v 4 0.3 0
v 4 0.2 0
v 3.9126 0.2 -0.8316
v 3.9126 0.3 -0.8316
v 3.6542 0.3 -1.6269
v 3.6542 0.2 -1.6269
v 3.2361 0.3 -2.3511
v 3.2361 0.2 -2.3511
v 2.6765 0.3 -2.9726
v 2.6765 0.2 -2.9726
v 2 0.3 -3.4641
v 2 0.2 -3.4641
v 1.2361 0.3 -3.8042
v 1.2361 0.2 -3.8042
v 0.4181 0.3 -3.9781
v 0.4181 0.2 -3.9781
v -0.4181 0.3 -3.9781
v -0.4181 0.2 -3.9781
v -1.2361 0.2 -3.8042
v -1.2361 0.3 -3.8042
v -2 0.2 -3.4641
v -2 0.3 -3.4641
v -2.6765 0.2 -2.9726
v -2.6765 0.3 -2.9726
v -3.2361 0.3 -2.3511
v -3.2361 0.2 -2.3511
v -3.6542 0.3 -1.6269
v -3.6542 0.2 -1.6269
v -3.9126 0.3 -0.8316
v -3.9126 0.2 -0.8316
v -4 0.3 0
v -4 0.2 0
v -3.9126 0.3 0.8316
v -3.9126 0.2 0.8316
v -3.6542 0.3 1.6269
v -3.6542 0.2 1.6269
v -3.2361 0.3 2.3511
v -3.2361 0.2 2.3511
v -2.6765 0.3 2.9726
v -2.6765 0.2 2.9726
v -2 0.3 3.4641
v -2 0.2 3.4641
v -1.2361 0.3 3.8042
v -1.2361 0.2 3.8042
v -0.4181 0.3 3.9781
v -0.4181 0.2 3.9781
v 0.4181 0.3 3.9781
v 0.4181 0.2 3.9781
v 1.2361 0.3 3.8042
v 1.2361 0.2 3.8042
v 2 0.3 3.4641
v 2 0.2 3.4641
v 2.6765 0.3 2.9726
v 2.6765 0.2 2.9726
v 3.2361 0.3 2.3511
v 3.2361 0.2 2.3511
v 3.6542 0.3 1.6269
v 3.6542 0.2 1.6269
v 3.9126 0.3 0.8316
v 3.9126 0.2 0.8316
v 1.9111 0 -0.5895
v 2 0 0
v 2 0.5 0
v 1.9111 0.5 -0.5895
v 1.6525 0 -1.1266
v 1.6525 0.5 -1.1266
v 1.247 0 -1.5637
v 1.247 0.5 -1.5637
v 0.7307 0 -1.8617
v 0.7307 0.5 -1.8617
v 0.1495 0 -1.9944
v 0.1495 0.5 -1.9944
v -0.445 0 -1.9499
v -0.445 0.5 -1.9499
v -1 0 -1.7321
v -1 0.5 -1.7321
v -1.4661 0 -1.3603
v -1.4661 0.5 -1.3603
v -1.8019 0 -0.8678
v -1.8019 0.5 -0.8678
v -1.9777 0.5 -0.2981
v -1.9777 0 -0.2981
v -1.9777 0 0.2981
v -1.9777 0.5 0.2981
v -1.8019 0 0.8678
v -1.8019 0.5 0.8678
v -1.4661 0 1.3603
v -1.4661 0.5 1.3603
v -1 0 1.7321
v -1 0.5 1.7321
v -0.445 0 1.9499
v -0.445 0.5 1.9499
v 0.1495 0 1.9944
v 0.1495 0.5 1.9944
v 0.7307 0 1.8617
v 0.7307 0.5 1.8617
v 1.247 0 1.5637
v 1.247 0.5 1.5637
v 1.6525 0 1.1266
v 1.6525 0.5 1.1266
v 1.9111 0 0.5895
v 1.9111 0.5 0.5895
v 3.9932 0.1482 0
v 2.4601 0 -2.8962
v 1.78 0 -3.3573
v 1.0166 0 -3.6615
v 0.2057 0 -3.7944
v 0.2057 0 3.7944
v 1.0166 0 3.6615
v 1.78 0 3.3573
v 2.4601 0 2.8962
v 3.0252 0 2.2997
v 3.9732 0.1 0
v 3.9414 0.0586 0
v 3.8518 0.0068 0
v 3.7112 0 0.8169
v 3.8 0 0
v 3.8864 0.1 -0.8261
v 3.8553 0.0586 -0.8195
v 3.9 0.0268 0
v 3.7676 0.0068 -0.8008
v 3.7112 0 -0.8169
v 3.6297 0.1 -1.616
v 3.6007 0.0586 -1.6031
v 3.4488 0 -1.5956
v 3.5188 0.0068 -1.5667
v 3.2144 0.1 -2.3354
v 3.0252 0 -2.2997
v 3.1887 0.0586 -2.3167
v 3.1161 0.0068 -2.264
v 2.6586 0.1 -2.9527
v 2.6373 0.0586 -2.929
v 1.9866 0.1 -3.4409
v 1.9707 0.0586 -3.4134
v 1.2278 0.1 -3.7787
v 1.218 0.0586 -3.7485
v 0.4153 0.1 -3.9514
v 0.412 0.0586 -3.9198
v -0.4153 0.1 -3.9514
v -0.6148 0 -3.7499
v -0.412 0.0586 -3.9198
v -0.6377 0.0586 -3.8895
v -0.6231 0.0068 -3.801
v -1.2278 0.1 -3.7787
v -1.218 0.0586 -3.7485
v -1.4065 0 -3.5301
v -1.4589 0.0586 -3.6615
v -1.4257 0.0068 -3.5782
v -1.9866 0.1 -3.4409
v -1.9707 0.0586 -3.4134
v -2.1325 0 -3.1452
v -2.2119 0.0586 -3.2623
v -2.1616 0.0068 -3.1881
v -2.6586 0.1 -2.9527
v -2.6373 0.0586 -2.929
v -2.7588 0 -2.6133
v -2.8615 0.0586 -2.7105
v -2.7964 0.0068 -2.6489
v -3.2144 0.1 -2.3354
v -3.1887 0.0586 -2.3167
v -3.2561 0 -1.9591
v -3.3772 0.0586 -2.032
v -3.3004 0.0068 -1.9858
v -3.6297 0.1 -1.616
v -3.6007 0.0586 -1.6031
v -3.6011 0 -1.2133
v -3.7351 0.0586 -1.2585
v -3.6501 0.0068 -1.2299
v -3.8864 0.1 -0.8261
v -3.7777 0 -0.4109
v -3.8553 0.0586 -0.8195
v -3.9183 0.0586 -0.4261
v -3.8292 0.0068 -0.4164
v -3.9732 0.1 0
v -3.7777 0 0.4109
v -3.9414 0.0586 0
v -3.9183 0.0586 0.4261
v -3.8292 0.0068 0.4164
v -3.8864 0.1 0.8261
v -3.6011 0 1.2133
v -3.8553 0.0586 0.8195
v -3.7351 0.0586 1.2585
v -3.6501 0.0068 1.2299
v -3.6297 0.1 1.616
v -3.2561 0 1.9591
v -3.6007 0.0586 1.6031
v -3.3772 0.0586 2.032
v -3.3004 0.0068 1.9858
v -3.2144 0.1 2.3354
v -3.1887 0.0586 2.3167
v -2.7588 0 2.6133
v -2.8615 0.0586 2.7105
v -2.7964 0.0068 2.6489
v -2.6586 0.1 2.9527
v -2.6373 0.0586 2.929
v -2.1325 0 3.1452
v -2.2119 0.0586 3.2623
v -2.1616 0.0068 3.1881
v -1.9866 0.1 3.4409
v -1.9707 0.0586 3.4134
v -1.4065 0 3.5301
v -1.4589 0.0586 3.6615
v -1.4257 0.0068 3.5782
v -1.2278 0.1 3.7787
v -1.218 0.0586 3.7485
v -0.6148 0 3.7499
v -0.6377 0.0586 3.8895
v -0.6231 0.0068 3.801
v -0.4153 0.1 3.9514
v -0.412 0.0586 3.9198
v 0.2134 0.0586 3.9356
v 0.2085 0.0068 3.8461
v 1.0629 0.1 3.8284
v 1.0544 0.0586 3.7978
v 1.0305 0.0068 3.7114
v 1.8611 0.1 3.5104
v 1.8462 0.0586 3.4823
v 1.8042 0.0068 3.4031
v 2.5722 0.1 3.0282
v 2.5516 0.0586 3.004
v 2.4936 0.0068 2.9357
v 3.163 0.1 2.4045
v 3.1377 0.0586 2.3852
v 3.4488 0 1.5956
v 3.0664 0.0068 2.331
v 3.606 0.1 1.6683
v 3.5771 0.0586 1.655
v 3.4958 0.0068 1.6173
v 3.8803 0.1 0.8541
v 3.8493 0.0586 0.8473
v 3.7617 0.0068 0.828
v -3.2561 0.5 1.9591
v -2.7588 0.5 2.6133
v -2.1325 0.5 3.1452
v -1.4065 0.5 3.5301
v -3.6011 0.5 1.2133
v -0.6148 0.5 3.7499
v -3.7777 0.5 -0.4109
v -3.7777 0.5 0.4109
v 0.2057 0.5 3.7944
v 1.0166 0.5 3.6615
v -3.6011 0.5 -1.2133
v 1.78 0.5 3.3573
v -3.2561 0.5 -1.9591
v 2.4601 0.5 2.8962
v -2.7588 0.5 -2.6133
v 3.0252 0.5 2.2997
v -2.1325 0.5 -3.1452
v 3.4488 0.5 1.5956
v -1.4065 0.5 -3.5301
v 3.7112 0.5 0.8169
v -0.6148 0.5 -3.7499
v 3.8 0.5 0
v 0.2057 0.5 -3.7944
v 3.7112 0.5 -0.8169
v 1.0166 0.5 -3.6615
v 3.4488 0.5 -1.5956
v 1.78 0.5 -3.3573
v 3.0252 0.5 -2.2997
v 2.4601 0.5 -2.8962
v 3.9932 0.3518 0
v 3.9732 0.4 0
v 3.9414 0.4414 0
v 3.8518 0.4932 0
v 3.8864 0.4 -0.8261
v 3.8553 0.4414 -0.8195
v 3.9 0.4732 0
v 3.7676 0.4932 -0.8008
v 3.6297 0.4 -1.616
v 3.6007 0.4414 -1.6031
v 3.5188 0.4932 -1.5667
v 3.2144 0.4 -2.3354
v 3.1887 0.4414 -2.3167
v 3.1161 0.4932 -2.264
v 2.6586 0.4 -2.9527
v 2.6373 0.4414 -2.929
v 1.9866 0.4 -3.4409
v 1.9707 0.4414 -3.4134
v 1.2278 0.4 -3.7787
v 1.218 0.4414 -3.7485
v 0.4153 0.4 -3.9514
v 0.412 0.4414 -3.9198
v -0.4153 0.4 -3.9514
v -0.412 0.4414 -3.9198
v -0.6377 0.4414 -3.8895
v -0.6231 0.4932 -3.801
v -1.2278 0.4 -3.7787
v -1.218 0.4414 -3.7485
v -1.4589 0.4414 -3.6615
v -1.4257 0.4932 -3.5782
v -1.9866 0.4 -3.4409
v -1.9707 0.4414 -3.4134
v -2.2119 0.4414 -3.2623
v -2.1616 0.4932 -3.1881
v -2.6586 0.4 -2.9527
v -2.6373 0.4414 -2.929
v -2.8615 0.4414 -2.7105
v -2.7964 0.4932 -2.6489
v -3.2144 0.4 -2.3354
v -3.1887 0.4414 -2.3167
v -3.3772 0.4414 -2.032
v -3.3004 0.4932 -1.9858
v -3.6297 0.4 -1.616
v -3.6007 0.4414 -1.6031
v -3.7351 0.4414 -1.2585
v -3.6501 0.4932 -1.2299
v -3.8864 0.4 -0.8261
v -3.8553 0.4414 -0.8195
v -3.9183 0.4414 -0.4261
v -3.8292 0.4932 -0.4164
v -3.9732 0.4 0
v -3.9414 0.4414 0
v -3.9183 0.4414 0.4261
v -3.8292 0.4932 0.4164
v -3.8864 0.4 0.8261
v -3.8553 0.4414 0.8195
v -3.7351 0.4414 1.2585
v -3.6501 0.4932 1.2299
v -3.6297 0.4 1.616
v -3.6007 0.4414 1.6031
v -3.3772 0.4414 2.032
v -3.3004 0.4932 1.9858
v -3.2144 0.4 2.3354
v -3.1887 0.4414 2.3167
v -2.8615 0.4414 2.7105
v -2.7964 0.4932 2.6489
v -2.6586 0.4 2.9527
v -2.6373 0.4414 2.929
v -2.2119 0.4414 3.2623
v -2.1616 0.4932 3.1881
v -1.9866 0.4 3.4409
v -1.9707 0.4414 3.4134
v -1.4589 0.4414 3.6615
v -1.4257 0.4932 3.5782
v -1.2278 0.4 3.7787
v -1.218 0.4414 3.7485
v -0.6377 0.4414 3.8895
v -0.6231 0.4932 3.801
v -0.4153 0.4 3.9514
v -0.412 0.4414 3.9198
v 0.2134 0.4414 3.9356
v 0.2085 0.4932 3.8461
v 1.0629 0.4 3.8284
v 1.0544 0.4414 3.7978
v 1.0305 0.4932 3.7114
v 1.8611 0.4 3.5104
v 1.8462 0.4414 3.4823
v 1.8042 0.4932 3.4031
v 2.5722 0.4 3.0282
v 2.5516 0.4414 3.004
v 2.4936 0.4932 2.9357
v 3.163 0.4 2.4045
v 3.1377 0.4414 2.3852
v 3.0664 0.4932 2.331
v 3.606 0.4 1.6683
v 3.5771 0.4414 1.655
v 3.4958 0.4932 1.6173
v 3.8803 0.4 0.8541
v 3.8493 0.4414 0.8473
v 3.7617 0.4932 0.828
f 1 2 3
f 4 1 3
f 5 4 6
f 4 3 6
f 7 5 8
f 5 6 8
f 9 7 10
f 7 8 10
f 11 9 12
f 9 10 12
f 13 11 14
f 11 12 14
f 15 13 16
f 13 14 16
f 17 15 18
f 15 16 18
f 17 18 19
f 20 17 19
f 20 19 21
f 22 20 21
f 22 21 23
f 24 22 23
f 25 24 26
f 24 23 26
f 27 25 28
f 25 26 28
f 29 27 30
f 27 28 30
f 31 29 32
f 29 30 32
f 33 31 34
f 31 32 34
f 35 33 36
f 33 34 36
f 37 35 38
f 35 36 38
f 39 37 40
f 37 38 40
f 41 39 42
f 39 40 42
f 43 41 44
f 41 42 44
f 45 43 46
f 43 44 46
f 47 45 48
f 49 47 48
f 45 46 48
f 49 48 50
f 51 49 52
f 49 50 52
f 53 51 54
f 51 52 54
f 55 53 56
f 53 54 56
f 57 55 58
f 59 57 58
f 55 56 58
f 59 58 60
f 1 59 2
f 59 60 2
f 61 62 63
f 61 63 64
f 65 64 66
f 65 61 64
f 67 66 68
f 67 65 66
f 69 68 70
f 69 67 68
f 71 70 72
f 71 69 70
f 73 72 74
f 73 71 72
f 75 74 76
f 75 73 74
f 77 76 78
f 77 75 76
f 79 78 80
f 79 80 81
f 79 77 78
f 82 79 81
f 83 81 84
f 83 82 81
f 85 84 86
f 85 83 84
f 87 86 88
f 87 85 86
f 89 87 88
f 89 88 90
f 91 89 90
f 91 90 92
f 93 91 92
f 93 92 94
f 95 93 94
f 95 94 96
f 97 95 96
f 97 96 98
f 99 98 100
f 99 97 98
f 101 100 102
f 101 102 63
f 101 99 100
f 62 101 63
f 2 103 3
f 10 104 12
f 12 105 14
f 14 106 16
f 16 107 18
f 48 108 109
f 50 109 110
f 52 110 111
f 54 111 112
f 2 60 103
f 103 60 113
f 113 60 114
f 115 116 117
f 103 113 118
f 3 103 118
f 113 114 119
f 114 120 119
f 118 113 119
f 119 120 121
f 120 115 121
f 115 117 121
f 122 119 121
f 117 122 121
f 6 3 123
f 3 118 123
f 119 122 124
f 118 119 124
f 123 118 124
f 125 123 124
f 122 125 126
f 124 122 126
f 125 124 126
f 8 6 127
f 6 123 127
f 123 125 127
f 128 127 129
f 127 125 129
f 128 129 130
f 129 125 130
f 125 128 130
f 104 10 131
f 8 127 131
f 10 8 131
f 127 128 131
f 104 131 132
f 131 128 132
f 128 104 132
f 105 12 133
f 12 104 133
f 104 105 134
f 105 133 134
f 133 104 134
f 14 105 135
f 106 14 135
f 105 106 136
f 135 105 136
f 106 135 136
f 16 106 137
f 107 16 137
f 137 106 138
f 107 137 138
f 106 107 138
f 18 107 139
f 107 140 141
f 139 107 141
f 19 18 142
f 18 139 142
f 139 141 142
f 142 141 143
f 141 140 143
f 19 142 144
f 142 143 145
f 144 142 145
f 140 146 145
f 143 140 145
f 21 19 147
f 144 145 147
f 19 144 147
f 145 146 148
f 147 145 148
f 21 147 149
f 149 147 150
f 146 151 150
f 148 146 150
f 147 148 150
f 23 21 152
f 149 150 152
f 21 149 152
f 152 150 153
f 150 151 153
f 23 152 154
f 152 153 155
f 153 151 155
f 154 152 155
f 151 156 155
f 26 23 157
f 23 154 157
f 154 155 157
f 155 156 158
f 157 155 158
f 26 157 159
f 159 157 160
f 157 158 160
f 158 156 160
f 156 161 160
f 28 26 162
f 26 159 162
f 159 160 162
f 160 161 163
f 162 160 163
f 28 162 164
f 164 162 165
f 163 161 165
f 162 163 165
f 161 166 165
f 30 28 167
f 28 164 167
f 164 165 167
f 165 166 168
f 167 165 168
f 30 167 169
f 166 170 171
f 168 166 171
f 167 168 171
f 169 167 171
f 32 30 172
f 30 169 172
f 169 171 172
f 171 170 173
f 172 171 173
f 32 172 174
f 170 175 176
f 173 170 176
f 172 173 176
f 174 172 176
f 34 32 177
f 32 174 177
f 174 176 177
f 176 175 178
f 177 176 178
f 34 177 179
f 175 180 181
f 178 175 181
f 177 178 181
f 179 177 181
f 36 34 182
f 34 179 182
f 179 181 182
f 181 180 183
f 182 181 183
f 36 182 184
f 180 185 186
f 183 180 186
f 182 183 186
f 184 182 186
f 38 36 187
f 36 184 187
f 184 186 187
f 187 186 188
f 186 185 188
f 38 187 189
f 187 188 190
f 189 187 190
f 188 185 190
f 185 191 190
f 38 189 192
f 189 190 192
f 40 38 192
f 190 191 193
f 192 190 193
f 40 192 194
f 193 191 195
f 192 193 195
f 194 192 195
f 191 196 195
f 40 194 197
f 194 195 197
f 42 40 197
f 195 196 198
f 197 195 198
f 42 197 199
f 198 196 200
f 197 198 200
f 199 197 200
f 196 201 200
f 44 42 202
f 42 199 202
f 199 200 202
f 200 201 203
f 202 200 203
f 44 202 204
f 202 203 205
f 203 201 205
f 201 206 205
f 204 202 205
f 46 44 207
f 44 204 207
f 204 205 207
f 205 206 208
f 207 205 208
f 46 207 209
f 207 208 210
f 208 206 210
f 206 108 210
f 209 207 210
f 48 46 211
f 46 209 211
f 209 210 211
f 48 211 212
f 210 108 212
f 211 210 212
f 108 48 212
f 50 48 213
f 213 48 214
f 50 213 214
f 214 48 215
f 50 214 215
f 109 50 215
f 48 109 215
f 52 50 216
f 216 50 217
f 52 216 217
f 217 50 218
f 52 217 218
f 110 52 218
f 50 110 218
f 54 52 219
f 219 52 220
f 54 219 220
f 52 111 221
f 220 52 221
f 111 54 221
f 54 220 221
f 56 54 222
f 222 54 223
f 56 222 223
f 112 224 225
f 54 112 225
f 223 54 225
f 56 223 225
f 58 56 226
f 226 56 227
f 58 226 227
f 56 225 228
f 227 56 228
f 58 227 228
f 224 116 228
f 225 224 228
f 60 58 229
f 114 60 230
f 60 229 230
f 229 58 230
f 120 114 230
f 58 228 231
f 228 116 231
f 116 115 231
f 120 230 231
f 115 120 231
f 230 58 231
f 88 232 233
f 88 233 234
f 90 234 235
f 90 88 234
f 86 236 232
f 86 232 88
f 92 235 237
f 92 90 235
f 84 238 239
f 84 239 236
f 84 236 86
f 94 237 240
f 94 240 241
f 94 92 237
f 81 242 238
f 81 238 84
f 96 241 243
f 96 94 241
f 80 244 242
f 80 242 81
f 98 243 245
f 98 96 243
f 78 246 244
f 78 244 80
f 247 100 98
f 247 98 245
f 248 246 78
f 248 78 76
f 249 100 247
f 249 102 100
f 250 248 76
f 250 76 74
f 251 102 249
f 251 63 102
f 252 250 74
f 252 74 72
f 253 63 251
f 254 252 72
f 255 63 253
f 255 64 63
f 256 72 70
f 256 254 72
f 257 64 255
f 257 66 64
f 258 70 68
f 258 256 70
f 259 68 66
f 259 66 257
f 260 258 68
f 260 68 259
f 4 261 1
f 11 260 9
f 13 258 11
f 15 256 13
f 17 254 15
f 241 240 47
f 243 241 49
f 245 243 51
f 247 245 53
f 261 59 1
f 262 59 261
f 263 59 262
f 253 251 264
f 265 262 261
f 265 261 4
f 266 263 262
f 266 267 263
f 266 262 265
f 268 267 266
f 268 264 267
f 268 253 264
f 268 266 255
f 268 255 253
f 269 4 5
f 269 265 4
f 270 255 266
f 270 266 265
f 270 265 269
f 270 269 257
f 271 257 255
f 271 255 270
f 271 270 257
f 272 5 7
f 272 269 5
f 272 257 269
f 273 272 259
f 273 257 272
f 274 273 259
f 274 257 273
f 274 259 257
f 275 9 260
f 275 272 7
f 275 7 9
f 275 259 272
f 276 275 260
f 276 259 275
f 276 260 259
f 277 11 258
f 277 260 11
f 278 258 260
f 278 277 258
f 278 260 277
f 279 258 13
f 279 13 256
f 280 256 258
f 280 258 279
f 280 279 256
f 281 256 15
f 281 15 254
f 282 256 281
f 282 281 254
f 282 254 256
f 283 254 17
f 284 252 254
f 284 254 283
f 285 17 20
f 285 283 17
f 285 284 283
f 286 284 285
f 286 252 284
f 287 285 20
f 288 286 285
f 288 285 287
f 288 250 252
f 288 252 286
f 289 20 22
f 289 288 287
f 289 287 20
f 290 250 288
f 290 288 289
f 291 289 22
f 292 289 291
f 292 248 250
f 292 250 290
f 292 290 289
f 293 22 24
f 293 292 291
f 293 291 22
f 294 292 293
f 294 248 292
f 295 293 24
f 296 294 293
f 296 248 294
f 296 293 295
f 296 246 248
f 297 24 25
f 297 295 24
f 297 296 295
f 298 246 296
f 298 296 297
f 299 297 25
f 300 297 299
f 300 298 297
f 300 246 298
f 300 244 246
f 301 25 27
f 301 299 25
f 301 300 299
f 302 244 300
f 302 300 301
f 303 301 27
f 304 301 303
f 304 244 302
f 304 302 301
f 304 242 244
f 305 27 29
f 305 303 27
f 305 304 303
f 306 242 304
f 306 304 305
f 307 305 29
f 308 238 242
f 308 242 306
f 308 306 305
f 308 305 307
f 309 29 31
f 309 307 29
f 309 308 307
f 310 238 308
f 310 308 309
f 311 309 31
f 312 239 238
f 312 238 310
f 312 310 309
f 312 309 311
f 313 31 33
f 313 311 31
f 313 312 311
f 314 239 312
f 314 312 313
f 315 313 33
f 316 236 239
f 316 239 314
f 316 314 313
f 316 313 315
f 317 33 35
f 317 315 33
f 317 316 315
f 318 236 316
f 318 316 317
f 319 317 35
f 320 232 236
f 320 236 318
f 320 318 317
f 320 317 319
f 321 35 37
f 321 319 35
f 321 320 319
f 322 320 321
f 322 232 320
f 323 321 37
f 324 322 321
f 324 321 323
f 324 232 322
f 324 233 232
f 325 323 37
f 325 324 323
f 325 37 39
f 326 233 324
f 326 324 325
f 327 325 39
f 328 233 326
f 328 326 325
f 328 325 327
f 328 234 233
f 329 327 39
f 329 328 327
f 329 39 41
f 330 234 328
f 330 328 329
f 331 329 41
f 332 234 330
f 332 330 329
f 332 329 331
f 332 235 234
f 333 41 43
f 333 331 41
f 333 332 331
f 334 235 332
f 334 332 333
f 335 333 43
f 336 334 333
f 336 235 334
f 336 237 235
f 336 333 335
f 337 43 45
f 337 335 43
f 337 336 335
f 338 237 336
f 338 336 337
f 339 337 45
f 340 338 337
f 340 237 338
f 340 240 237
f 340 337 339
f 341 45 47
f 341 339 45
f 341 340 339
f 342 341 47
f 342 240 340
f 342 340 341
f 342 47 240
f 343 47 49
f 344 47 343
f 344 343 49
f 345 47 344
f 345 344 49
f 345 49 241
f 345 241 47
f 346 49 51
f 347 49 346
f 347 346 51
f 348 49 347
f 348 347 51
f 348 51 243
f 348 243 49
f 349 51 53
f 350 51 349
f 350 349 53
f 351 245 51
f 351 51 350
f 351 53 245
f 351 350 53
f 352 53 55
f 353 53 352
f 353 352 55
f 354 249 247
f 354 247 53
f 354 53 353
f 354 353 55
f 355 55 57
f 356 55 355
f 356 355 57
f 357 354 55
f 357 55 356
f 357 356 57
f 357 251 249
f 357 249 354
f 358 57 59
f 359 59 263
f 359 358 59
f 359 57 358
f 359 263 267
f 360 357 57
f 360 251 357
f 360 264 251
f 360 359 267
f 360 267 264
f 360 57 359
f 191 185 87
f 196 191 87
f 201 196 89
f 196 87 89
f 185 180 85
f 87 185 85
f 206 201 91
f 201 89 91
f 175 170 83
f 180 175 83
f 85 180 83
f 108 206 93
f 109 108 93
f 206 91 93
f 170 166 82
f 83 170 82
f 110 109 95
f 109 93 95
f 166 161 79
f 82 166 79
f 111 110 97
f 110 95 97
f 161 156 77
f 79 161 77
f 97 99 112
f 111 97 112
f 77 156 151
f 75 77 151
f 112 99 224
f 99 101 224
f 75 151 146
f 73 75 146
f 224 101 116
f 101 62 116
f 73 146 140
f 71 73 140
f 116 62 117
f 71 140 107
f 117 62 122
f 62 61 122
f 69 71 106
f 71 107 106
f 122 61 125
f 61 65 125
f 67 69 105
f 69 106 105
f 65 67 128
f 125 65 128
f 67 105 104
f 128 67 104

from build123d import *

# Parameters (mm, degrees)
SKETCH1_R           = 4
SKETCH1_R_2         = 2
BOSS_EXTRUDE1_DEPTH = 0.5
FILLET1_R           = 0.2
FILLET2_R           = 0.2


with BuildPart() as part:
    # Sketch1 → Boss-Extrude1 (new body)
    with BuildSketch(Plane(origin=(0, 0, 0), x_dir=(1, 0, 0), z_dir=(0, 1, 0))):
        Circle(SKETCH1_R)
        Circle(SKETCH1_R_2, mode=Mode.SUBTRACT)
    extrude(amount=BOSS_EXTRUDE1_DEPTH)

    # Fillet1
    fillet1_edges = [part.edges().sort_by_distance(p)[0] for p in [
        (-4, 0.5, 0),
    ]]
    fillet(fillet1_edges, radius=FILLET1_R)

    # Fillet2
    fillet2_edges = [part.edges().sort_by_distance(p)[0] for p in [
        (-4, 0, 0),
    ]]
    fillet(fillet2_edges, radius=FILLET2_R)


solid = part.part
